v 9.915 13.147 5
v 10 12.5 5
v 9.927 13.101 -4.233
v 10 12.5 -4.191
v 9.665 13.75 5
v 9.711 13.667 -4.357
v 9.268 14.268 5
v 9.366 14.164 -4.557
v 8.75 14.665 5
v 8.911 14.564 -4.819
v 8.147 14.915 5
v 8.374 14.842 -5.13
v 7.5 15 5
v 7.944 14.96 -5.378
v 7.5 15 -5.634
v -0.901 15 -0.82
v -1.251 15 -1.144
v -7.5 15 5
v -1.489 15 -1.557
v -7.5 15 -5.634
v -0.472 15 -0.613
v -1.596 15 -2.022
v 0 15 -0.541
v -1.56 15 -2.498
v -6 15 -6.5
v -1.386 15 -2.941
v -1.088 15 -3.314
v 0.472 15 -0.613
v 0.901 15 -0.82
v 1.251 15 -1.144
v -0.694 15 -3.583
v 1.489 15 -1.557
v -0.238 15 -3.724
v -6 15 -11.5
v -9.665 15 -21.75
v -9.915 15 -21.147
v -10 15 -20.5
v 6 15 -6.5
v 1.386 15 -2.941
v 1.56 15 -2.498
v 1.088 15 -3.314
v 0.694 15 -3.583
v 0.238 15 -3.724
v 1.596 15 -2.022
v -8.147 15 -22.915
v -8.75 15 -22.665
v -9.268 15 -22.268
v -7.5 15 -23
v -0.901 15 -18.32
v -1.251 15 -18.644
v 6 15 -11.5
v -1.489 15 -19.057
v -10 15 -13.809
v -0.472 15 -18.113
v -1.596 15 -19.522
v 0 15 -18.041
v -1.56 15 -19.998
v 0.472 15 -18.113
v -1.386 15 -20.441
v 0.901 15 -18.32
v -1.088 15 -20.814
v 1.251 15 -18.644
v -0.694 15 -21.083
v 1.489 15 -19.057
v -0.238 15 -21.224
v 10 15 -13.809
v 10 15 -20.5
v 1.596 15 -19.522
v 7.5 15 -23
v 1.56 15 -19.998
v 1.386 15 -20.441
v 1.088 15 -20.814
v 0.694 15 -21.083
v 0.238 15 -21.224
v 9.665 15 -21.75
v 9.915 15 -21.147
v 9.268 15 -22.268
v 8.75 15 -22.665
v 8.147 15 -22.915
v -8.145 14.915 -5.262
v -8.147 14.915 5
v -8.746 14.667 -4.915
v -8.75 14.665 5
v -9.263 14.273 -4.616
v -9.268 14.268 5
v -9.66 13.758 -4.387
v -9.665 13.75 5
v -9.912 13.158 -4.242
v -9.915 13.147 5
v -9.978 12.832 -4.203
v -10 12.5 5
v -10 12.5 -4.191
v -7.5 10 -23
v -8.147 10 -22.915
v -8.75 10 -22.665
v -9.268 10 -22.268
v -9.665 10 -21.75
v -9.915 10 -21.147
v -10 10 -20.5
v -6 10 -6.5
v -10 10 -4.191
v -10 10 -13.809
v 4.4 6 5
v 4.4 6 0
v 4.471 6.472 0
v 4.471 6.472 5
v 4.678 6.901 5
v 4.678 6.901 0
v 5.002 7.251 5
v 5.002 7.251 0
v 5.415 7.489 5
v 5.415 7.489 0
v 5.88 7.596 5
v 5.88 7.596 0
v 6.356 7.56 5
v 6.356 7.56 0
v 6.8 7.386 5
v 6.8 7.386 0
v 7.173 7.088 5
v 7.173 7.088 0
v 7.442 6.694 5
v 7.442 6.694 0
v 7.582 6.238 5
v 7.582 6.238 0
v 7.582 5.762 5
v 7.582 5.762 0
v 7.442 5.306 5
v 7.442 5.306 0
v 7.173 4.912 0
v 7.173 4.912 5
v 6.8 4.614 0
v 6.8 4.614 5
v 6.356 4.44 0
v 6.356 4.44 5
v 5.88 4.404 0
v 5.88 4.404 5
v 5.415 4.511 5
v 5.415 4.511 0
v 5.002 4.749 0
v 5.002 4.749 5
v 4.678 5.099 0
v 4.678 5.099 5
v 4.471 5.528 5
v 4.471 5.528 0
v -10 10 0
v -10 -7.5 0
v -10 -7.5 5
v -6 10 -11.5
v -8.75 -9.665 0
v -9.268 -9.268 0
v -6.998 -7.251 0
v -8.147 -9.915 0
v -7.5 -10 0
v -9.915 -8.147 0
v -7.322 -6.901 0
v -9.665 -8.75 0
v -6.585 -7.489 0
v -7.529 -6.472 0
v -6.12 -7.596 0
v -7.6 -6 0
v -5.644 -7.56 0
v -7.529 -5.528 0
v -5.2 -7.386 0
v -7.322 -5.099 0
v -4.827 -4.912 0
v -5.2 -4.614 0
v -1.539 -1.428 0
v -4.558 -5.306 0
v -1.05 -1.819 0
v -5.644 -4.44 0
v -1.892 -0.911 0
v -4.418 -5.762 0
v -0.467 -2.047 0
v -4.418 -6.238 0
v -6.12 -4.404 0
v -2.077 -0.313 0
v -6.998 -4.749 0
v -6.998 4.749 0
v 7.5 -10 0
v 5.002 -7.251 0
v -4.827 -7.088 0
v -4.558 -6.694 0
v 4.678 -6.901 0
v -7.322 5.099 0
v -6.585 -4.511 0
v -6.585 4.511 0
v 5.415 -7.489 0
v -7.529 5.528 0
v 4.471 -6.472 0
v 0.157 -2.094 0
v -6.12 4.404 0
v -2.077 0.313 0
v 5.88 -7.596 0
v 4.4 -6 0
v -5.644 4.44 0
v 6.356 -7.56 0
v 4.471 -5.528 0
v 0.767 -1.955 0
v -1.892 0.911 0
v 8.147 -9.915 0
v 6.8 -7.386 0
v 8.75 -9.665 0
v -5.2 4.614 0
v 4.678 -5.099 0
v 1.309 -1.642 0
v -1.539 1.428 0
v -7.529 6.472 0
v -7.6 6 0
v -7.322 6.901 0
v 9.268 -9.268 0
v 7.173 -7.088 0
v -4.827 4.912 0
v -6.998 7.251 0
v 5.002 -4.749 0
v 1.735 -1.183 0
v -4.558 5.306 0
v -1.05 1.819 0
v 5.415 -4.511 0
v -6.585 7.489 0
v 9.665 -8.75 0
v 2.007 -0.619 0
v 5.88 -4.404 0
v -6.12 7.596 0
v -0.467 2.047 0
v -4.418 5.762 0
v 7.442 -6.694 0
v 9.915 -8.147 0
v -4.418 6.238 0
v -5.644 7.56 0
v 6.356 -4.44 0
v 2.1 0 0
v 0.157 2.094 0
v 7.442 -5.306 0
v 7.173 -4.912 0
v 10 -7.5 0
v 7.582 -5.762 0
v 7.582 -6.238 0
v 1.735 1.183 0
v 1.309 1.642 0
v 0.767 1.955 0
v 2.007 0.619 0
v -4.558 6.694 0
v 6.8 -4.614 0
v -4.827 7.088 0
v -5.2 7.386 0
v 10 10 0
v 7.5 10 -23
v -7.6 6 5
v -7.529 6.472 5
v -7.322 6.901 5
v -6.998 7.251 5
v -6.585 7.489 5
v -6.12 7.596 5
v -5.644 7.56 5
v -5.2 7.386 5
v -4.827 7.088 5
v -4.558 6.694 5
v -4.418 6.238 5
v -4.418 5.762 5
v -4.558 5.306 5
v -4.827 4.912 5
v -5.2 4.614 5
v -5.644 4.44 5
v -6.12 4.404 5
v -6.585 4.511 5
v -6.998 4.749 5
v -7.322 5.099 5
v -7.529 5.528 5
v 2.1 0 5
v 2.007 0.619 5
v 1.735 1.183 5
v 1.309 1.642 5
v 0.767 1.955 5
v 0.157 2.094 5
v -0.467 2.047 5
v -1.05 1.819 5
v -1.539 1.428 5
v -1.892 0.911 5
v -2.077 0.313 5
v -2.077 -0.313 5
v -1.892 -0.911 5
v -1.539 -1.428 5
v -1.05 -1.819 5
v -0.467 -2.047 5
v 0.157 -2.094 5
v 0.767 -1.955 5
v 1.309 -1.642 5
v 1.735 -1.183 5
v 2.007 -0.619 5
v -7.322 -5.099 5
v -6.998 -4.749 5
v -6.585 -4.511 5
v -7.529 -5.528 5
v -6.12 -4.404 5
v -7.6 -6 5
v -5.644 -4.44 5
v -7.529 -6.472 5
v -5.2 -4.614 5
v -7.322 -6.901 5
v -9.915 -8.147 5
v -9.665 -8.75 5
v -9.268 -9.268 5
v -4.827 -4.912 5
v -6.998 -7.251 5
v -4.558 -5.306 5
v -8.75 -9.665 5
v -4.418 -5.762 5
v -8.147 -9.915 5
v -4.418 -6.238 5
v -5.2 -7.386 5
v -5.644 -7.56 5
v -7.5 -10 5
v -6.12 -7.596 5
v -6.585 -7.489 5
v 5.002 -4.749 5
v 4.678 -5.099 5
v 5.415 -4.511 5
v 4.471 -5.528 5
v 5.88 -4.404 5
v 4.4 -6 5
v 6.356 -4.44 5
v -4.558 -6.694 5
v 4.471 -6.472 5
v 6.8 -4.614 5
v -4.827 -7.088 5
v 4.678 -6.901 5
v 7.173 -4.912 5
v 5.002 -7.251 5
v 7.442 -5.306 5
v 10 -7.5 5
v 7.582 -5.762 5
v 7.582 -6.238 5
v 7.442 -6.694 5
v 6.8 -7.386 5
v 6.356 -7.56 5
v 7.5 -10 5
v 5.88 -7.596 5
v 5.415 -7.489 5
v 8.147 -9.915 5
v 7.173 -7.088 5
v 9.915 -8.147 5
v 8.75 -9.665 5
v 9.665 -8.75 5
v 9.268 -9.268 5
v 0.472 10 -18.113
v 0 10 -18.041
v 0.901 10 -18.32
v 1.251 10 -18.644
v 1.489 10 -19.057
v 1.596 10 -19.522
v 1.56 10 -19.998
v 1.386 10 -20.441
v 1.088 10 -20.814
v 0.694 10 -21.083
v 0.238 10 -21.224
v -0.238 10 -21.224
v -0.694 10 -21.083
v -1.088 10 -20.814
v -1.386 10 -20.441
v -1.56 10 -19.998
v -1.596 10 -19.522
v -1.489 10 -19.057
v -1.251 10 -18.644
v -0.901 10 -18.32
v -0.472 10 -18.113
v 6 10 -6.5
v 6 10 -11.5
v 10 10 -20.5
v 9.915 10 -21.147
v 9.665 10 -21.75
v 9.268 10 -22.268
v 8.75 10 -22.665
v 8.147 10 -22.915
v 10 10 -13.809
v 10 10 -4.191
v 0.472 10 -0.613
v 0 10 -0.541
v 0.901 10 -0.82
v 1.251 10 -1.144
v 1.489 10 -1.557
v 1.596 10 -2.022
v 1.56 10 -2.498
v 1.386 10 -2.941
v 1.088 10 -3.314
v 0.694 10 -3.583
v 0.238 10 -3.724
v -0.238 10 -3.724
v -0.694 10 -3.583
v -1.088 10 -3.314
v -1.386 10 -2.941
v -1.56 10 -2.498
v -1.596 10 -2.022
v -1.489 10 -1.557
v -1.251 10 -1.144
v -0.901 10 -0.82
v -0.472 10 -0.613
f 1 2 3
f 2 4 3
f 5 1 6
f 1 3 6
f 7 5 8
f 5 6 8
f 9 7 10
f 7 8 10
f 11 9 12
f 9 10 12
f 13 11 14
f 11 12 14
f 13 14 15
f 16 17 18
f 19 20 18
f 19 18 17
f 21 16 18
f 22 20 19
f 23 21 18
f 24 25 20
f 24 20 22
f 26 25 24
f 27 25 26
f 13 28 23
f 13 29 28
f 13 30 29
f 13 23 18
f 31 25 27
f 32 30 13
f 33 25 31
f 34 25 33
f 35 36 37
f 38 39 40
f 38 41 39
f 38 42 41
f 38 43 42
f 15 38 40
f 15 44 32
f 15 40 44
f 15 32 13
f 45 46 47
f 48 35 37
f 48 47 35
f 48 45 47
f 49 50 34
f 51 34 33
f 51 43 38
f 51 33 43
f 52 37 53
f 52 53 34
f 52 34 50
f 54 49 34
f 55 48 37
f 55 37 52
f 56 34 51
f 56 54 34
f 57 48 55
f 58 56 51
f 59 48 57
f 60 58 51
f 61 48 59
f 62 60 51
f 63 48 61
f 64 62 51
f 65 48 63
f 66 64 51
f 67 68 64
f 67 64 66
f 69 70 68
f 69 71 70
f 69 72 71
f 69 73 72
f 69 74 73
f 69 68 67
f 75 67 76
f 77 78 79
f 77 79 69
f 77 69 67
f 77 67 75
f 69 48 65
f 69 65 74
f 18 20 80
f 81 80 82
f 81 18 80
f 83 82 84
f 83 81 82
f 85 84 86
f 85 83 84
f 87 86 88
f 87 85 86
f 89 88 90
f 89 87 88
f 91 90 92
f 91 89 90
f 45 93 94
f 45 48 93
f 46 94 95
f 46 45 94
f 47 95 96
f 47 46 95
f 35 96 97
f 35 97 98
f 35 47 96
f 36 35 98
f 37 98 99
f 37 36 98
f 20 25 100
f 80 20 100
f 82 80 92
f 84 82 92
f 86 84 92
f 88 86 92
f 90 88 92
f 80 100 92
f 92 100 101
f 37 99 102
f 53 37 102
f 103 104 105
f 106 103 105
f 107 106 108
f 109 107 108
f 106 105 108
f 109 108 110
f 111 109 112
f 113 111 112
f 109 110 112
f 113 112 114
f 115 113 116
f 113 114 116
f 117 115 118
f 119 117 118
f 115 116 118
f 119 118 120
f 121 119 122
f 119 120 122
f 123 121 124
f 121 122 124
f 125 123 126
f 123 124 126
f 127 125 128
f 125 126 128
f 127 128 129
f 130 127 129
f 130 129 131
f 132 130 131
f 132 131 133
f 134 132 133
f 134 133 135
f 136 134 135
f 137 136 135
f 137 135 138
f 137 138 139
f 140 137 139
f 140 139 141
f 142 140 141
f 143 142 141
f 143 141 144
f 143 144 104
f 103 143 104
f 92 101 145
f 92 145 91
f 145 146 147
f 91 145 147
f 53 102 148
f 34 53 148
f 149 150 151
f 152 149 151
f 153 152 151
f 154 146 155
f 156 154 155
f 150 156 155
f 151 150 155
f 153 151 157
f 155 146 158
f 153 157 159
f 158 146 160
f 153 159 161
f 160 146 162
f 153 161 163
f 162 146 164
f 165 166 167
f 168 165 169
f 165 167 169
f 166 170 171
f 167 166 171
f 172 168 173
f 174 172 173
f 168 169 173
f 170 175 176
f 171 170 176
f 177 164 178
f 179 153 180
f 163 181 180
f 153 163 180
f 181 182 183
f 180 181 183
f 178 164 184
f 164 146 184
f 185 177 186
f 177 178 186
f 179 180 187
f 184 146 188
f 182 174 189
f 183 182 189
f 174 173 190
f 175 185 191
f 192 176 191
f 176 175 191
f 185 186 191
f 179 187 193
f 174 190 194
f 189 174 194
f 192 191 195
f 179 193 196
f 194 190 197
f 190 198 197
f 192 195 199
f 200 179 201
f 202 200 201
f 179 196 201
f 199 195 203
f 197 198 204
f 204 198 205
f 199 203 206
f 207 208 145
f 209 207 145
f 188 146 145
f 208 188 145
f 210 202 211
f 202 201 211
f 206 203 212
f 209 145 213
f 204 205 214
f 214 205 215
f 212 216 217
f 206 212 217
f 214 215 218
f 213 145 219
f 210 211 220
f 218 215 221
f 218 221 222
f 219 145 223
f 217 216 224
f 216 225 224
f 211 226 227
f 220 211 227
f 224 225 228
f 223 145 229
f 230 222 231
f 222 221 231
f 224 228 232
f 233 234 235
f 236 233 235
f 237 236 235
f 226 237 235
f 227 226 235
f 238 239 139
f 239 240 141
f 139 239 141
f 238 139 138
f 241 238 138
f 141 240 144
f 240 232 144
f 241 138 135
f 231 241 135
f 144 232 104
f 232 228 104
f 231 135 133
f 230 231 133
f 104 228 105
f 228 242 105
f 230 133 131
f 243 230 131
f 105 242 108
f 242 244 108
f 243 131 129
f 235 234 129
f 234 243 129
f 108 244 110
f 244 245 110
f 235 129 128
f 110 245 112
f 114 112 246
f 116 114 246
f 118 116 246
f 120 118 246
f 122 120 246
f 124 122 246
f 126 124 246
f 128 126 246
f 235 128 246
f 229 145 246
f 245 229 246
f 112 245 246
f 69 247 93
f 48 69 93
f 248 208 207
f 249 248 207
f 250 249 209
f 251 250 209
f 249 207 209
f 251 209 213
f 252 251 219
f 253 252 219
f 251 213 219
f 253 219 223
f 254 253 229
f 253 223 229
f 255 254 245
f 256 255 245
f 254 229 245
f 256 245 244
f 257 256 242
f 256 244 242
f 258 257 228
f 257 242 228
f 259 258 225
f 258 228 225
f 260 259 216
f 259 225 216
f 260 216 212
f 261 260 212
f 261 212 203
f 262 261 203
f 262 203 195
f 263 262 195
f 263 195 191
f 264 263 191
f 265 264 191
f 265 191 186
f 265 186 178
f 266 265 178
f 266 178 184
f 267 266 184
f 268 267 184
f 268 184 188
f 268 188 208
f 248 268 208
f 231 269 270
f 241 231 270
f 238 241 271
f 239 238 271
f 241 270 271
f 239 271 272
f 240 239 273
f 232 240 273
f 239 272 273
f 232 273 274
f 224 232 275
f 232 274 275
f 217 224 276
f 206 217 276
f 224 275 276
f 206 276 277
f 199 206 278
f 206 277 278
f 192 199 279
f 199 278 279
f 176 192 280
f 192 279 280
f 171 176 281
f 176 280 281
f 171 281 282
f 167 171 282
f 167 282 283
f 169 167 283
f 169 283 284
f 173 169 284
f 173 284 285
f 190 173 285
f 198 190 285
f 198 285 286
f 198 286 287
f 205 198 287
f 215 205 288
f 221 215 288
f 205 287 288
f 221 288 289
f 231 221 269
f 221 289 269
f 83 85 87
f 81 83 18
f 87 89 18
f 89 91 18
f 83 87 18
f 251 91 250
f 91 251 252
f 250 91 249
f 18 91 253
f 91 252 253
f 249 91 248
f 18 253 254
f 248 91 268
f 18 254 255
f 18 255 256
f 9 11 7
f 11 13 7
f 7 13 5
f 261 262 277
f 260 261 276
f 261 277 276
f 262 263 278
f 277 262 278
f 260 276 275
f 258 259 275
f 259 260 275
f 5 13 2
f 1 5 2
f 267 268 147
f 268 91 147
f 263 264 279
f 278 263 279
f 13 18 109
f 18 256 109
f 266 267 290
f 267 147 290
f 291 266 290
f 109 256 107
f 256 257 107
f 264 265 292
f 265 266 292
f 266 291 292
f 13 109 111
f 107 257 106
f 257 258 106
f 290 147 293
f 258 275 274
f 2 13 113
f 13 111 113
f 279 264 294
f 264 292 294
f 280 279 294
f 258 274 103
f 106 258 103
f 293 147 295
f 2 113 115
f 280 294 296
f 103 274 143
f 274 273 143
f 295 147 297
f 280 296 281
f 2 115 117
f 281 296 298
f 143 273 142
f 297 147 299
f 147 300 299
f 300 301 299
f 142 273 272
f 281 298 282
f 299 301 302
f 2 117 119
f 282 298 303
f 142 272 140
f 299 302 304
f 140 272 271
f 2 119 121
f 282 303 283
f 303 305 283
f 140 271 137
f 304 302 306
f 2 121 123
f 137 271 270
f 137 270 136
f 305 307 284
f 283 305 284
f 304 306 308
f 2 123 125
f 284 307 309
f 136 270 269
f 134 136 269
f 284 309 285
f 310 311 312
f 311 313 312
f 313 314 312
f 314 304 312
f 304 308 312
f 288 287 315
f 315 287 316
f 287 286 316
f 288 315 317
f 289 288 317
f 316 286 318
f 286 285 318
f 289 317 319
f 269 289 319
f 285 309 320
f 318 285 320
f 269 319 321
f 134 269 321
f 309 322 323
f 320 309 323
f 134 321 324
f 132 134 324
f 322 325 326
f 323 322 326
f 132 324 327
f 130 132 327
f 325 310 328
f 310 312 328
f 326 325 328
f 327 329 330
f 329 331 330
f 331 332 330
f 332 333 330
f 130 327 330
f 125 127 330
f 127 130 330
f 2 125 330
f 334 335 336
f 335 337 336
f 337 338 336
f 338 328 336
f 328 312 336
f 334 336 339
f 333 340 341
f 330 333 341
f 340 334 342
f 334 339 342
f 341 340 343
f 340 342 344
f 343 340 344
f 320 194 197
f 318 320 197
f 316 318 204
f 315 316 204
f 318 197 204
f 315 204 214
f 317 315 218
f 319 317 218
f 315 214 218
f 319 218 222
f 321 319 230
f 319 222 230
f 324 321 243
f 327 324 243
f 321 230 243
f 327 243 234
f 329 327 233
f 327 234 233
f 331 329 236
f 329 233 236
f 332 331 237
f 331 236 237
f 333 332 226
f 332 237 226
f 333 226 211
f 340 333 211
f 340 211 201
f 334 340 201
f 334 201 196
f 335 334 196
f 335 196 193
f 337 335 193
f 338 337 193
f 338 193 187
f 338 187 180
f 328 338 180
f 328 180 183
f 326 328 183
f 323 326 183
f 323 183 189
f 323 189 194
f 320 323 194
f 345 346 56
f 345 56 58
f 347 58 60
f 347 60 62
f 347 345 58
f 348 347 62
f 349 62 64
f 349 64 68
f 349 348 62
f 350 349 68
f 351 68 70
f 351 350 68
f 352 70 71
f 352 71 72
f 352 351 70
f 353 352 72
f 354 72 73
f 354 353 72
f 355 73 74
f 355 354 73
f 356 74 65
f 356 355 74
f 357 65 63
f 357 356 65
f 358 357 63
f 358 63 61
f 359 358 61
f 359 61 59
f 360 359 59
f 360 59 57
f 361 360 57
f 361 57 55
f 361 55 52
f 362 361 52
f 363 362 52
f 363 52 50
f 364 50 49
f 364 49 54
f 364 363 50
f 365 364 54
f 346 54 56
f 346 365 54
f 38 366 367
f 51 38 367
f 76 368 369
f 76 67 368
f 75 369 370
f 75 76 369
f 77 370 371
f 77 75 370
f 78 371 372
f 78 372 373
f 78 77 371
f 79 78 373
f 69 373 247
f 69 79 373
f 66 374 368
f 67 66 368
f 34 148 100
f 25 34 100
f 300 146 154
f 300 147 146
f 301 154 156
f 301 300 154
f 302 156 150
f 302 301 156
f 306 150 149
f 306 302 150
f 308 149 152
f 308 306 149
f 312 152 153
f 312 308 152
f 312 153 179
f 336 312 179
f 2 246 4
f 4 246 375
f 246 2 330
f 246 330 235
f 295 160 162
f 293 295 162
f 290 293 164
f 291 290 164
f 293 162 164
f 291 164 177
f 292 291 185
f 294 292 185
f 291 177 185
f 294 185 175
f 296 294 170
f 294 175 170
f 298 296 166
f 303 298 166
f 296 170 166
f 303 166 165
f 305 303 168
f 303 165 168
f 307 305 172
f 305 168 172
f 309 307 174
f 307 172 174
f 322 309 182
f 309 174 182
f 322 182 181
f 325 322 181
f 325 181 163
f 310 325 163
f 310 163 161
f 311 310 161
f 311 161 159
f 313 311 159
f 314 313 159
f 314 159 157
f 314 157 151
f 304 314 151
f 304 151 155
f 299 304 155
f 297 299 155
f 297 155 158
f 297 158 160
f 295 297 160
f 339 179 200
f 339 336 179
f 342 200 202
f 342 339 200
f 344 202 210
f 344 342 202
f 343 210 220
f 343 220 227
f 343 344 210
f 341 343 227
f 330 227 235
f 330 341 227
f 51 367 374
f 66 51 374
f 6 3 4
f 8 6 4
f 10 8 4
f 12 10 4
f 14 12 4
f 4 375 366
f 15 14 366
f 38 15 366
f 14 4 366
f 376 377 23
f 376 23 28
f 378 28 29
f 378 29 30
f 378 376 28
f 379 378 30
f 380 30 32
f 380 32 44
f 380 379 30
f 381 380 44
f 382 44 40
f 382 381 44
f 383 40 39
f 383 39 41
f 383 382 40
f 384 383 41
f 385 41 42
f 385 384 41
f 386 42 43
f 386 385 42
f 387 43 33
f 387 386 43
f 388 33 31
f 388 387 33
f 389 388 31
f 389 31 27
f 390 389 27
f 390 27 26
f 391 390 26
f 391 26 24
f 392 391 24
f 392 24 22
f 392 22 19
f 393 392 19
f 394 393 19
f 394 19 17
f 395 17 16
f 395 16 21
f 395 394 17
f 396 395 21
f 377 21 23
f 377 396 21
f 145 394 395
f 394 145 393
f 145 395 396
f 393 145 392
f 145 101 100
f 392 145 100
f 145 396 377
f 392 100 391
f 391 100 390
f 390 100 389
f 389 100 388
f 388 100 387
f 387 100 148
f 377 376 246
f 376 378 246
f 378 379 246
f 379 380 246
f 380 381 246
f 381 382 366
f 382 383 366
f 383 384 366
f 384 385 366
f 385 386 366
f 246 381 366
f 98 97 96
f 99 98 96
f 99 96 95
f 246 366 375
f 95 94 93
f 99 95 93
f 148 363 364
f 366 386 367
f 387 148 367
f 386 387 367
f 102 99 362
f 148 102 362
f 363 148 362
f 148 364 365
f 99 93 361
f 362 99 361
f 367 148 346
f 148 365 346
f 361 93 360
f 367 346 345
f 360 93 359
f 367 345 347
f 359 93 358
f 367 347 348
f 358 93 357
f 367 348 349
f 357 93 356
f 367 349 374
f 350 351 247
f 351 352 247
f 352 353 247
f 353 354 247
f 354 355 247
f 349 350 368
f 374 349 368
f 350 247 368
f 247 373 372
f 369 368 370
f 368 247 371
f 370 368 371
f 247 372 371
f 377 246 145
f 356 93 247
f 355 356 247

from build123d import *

# Parameters (mm, degrees)
SKETCH2_W           = 20
SKETCH2_H           = 20
BOSS_EXTRUDE1_DEPTH = 5
SKETCH3_R           = 2.1
CUT_EXTRUDE1_DEPTH  = 5
FILLET2_R           = 2.5
SKETCH5_R           = 1.6
BOSS_EXTRUDE2_DEPTH = 5
FILLET4_R           = 2.5
SKETCH6_R           = 1.6
CUT_EXTRUDE2_DEPTH  = 10


with BuildPart() as part:
    # Sketch2 → Boss-Extrude1 (new body)
    with BuildSketch(Plane.XY):
        Rectangle(SKETCH2_W, SKETCH2_H)
    extrude(amount=BOSS_EXTRUDE1_DEPTH)

    # Sketch3 → Cut-Extrude1 (cut)
    with BuildSketch(Plane.XY.offset(5)):
        Circle(SKETCH3_R)
    extrude(amount=-CUT_EXTRUDE1_DEPTH, mode=Mode.SUBTRACT)

    # Fillet2
    fillet2_edges = [part.edges().sort_by_distance(p)[0] for p in [
        (10, -10, 2.5),
        (-10, -10, 2.5),
    ]]
    fillet(fillet2_edges, radius=FILLET2_R)

    # Sketch5 → Boss-Extrude2 (add)
    with BuildSketch(Plane(origin=(0, 10, 0), x_dir=(1, 0, 0), z_dir=(0, 1, 0))):
        Polygon((-10, -5), (10, -5), (10, 4.190598923), (6, 6.5), (6, 11.5), (10, 13.809401077), (10, 23), (-10, 23), (-10, 13.809401077), (-6, 11.5), (-6, 6.5), (-10, 4.190598923), align=None)
        with Locations(Location((0, 2.141483503, 0), (0, 0, 270))):
            Circle(SKETCH5_R, mode=Mode.SUBTRACT)
        with Locations(Location((0, 19.641483503, 0), (0, 0, 270))):
            Circle(SKETCH5_R, mode=Mode.SUBTRACT)
    extrude(amount=BOSS_EXTRUDE2_DEPTH)

    # Fillet4
    fillet4_edges = [part.edges().sort_by_distance(p)[0] for p in [
        (-10, 15, 0.404700538),
        (10, 15, 0.404700538),
        (10, 12.5, -23),
        (-10, 12.5, -23),
    ]]
    fillet(fillet4_edges, radius=FILLET4_R)

    # Sketch6 → Cut-Extrude2 (cut)
    with BuildSketch(Plane(origin=(0, 0, 0), x_dir=(-1, 0, 0), z_dir=(0, 0, -1))):
        with Locations((-6, 6)):
            Circle(SKETCH6_R)
        with Locations((6, 6)):
            Circle(SKETCH6_R)
        with Locations((6, -6)):
            Circle(SKETCH6_R)
        with Locations((-6, -6)):
            Circle(SKETCH6_R)
    extrude(amount=-CUT_EXTRUDE2_DEPTH, mode=Mode.SUBTRACT)


solid = part.part
